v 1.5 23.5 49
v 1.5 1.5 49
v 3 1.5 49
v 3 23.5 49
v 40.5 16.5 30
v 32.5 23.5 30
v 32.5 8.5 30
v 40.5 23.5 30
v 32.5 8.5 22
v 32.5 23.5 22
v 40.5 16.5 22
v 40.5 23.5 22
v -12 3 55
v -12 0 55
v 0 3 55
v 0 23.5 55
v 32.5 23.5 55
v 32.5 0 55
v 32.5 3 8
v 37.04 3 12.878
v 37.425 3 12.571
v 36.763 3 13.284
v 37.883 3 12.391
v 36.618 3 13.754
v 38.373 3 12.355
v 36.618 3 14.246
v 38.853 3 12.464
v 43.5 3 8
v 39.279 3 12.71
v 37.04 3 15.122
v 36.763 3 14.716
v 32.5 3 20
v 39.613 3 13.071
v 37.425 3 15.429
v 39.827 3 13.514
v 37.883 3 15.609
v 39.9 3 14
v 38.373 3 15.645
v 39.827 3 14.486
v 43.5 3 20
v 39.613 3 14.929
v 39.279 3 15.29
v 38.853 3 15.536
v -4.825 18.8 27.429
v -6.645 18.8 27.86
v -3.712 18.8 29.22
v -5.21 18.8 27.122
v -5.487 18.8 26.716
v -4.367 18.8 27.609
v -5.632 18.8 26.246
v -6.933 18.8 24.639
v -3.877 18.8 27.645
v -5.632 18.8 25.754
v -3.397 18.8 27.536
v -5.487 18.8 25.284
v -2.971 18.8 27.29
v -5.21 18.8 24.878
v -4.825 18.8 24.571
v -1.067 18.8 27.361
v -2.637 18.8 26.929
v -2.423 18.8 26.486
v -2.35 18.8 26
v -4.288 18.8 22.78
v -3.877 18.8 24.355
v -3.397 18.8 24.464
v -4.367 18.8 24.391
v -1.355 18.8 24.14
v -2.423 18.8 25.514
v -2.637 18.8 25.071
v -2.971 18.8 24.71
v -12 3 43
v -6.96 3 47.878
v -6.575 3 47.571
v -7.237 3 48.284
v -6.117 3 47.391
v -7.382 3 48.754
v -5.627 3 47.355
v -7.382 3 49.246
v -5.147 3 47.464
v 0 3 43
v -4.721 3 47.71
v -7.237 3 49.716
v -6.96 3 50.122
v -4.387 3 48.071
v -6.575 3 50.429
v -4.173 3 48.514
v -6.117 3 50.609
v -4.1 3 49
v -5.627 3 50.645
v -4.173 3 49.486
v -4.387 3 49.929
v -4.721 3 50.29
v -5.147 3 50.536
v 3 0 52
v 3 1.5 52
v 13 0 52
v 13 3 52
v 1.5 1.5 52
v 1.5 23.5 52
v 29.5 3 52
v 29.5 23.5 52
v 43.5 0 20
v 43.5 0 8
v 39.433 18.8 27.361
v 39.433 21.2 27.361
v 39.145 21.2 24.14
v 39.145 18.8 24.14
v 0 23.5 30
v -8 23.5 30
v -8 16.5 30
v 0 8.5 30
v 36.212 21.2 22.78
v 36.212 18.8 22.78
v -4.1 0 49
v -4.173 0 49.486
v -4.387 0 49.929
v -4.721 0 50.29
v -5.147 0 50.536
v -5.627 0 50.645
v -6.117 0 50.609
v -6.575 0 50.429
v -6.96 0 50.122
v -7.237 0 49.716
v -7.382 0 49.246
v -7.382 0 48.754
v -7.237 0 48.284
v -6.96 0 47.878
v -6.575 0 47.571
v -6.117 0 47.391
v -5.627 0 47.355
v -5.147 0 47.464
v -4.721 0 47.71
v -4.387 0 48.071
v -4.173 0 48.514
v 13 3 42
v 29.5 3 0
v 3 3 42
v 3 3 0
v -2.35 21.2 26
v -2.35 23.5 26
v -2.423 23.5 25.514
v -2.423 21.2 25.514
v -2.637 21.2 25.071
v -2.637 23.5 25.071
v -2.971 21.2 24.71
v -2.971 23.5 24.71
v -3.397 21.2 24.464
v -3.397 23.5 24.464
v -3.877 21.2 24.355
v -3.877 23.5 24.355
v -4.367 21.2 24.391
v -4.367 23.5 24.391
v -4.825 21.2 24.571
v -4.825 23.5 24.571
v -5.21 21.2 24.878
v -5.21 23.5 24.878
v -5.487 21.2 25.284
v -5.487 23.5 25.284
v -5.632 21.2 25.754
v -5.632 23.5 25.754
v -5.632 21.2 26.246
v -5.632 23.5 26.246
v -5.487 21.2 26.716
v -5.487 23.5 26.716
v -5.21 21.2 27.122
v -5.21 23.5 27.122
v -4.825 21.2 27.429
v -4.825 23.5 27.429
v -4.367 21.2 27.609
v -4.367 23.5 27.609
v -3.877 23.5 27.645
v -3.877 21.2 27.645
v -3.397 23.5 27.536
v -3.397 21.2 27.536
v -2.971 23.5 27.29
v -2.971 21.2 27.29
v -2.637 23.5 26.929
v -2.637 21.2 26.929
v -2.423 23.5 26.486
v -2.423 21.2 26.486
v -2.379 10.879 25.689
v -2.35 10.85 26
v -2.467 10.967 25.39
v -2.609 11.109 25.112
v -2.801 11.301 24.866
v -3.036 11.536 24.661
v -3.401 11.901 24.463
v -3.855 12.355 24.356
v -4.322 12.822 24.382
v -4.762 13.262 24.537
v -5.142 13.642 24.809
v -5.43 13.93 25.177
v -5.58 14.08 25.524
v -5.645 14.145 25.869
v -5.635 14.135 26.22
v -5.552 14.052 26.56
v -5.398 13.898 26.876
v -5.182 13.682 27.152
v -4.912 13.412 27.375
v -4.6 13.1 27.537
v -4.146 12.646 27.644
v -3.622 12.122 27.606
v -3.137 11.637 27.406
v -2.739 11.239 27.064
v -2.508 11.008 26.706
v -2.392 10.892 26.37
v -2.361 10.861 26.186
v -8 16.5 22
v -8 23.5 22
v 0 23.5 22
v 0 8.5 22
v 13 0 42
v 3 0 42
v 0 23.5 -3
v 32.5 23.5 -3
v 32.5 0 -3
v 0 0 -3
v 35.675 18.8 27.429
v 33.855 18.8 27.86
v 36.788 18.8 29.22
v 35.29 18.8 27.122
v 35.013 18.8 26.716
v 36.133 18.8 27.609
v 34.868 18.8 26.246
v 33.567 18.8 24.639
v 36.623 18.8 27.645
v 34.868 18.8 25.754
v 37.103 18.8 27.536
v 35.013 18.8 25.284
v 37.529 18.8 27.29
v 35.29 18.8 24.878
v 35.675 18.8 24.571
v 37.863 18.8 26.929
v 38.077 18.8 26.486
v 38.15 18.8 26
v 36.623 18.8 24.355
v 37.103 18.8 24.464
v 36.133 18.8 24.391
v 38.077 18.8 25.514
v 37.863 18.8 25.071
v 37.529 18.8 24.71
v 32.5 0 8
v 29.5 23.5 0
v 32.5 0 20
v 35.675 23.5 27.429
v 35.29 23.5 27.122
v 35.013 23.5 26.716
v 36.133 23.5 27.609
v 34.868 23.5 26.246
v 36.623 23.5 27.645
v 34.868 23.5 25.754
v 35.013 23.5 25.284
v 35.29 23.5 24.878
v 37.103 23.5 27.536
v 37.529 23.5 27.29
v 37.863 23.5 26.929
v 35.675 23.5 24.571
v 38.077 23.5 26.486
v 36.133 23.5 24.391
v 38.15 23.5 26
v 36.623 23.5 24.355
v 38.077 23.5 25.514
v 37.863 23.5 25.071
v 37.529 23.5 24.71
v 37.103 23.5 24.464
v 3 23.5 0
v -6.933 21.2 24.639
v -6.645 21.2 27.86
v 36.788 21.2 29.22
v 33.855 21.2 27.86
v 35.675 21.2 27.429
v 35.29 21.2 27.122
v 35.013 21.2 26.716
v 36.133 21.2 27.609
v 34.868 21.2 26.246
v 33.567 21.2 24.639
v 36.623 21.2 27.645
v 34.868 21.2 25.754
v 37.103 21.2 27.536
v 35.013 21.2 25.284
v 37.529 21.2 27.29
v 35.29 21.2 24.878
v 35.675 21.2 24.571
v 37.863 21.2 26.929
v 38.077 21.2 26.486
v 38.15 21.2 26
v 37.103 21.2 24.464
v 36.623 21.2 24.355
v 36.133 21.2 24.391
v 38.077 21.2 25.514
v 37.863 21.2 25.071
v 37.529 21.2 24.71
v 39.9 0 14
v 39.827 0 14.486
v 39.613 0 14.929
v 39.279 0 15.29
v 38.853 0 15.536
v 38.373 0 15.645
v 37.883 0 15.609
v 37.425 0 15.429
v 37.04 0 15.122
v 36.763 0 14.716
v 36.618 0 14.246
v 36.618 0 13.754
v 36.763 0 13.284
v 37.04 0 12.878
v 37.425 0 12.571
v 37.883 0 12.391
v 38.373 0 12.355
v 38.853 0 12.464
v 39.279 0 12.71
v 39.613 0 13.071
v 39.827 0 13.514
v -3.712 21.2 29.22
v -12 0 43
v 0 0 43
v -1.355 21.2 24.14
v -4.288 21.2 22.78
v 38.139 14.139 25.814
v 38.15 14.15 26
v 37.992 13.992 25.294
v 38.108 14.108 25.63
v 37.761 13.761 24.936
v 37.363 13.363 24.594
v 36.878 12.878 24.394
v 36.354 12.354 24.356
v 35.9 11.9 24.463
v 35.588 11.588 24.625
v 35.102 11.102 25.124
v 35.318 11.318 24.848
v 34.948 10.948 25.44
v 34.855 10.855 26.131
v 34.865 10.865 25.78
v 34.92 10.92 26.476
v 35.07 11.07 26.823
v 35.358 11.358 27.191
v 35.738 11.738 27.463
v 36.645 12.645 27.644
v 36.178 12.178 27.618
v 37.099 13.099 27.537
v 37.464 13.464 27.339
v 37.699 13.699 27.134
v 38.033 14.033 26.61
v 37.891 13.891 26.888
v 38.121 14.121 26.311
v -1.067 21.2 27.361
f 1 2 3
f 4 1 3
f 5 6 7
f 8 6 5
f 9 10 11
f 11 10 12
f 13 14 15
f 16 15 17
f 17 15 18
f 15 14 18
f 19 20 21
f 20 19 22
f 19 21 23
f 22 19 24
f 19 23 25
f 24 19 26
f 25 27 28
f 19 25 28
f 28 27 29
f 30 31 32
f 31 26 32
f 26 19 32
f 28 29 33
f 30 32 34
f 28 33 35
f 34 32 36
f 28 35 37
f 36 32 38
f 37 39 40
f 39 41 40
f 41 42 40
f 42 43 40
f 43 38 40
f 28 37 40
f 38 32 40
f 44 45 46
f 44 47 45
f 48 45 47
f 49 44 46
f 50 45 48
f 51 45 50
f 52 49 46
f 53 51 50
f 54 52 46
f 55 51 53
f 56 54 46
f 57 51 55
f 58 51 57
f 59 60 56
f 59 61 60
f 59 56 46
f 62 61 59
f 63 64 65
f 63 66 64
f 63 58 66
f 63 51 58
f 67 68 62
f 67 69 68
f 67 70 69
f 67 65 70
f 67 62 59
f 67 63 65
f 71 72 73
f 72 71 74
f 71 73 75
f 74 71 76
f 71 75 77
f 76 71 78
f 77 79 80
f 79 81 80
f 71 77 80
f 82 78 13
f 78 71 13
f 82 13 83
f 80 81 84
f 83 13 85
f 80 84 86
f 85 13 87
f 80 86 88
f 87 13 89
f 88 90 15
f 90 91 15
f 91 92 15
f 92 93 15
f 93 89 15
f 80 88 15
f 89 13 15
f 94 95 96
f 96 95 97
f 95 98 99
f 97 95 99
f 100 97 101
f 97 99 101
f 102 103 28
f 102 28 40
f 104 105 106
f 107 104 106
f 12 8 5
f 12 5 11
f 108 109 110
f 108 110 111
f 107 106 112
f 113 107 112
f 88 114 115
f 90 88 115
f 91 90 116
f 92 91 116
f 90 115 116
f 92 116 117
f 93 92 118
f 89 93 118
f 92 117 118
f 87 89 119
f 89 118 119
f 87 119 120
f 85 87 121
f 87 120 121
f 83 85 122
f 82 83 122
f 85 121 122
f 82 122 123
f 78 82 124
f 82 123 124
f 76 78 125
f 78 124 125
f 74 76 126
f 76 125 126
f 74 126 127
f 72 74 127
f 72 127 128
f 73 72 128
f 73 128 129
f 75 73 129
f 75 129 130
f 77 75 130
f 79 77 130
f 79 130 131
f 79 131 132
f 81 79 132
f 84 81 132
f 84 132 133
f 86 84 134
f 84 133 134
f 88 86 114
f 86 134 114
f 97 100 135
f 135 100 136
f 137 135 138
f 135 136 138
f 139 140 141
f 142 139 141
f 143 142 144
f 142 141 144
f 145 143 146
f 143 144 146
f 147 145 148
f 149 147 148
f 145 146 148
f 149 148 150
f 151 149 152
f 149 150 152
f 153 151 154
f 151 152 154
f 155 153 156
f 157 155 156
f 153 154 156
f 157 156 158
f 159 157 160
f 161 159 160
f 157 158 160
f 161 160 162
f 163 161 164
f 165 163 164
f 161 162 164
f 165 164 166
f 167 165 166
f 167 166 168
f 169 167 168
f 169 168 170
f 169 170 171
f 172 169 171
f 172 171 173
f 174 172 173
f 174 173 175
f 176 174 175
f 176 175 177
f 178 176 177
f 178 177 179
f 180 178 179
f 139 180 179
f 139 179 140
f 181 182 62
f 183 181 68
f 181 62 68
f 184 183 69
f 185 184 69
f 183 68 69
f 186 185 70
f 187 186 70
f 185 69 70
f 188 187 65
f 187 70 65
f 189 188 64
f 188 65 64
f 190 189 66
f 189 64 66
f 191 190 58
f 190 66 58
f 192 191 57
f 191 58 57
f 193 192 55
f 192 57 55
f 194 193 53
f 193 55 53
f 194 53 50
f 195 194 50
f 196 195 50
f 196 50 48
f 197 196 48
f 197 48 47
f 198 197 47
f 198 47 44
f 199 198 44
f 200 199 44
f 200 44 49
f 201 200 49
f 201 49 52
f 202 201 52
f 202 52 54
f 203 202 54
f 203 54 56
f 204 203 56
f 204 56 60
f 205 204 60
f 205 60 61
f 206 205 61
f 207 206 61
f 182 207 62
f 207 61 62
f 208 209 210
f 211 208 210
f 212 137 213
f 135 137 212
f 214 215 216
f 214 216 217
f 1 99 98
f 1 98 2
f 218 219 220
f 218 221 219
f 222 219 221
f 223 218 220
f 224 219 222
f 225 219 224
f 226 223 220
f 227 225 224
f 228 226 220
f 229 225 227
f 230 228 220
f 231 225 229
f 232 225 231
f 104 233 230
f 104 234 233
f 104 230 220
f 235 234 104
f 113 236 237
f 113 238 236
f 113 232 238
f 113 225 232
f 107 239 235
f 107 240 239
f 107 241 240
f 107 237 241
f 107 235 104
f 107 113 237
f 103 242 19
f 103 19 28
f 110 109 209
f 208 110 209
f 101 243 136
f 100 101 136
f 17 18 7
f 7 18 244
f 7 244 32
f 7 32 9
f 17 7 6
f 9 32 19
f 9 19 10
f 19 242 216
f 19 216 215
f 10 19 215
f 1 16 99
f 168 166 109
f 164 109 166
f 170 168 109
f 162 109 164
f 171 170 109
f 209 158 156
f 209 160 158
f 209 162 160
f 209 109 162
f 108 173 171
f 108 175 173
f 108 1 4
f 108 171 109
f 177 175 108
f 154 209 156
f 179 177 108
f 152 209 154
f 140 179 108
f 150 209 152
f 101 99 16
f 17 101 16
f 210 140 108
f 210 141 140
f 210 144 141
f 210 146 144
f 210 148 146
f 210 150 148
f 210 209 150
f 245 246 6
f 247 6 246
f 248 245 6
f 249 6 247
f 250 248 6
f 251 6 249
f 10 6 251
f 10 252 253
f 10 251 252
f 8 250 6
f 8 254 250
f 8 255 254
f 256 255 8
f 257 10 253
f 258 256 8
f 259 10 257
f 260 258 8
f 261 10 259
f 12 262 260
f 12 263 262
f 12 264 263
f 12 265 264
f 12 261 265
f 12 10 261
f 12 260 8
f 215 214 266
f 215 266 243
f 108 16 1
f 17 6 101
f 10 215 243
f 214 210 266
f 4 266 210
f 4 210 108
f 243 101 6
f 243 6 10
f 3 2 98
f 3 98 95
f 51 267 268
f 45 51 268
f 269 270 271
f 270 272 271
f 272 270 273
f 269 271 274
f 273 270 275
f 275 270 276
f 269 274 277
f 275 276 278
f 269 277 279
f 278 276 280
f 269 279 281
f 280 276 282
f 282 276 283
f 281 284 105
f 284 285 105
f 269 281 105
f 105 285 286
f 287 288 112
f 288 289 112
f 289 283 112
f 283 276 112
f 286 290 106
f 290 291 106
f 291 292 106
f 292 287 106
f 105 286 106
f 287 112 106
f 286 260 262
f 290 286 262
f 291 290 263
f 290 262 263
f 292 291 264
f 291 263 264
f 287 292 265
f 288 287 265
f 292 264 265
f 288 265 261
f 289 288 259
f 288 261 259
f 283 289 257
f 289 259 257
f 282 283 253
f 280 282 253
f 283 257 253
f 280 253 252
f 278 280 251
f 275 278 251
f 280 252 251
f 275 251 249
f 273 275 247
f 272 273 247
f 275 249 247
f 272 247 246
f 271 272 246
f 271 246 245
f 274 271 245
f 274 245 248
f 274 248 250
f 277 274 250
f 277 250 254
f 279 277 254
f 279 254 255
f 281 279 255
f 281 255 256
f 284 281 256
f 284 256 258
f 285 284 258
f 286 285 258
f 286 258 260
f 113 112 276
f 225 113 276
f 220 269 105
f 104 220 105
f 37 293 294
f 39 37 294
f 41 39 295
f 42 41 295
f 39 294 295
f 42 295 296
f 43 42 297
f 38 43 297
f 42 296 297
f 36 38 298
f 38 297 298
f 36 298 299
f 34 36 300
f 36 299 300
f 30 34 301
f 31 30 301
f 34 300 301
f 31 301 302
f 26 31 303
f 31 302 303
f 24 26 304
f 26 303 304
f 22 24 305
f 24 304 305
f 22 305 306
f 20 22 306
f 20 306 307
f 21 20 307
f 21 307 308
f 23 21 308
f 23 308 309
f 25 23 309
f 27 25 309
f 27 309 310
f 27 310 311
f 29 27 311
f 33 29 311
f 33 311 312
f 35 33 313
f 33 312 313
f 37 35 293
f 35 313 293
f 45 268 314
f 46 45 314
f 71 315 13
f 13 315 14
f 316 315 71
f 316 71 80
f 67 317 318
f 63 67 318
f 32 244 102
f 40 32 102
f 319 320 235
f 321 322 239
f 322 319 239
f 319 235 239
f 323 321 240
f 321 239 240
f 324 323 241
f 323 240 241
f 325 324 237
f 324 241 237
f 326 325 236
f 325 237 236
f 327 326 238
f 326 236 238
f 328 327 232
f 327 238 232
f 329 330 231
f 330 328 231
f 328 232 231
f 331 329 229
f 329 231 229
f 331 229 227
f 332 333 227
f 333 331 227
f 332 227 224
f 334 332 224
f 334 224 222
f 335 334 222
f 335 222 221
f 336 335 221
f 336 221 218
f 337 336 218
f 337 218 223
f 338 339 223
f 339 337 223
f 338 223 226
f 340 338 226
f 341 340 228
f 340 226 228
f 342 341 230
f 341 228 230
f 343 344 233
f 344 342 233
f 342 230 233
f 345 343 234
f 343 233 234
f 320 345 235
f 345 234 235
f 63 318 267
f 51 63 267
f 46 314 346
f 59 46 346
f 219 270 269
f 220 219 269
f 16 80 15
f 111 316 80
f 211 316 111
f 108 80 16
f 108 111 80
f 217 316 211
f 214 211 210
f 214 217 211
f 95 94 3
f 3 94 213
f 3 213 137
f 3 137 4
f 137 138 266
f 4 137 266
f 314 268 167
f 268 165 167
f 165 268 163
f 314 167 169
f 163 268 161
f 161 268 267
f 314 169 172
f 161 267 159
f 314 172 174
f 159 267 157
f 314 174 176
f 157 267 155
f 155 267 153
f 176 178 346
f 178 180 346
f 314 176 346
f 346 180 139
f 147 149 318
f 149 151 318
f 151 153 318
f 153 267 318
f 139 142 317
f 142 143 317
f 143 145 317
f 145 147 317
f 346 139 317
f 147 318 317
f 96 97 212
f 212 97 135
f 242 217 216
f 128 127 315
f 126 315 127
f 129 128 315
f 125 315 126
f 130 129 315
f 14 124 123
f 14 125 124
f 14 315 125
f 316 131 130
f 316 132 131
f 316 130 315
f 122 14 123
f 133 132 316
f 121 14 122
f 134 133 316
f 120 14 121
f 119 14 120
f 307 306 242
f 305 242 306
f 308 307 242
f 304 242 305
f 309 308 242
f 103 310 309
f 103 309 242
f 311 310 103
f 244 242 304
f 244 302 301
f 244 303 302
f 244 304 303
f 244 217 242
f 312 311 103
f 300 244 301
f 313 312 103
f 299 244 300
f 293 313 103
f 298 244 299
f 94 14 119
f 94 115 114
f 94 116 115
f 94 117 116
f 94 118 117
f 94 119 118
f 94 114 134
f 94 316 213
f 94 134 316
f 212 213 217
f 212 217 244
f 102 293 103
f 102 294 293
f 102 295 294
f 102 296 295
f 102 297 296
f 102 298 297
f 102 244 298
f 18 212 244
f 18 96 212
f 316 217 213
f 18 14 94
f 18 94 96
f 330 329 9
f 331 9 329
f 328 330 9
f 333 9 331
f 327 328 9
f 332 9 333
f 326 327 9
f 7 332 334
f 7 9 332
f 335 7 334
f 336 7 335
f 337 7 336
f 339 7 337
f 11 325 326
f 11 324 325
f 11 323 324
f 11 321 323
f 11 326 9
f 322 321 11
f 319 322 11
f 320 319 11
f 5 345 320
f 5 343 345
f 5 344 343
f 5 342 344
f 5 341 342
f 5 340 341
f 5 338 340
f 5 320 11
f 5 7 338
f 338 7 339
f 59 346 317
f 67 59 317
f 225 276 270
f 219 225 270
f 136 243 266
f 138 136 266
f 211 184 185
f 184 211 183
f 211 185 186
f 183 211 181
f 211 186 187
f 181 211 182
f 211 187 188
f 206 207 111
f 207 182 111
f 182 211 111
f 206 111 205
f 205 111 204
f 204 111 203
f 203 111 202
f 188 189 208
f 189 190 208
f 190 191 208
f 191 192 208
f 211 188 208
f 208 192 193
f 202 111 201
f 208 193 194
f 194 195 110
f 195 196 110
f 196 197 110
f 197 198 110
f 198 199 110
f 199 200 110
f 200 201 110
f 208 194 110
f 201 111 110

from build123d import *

# Parameters (mm, degrees)
BOSS_EXTRUDE1_DEPTH = 52
SKETCH2_W           = 32.5
SKETCH2_H           = 23.5
BOSS_EXTRUDE2_DEPTH = 3
SKETCH3_W           = 8
SKETCH3_H           = 8
SKETCH3_R           = 1.65
BOSS_EXTRUDE3_DEPTH = 15
CUT_EXTRUDE1_START  = -2.3
CUT_EXTRUDE1_DEPTH  = 2.4
CUT_EXTRUDE2_DEPTH  = 34
SKETCH6_W           = 32.5
SKETCH6_H           = 23.5
BOSS_EXTRUDE5_DEPTH = 3
SKETCH7_W           = 10
SKETCH7_H           = 10
CUT_EXTRUDE3_DEPTH  = 3
SKETCH8_W           = 9.75
SKETCH8_H           = 3
CUT_EXTRUDE4_DEPTH  = 22
SKETCH9_W           = 11
SKETCH9_H           = 12
SKETCH9_R           = 1.65
SKETCH9_W_2         = 12
BOSS_EXTRUDE6_DEPTH = 3


with BuildPart() as part:
    # Sketch1 → Boss-Extrude1 (new body)
    with BuildSketch(Plane.XY):
        Polygon((3, 20.5), (3, 23.5), (0, 23.5), (0, 0), (32.5, 0), (32.5, 23.5), (29.5, 23.5), (29.5, 20.5), (29.5, 3), (3, 3), align=None)
    extrude(amount=BOSS_EXTRUDE1_DEPTH)

    # Sketch2 → Boss-Extrude2 (add)
    with BuildSketch(Plane(origin=(0, 0, 0), x_dir=(-1, 0, 0), z_dir=(0, 0, -1))):
        with Locations((-16.25, 11.75)):
            Rectangle(SKETCH2_W, SKETCH2_H)
    extrude(amount=BOSS_EXTRUDE2_DEPTH)

    # Sketch3 → Boss-Extrude3 (add)
    with BuildSketch(Plane(origin=(0, 23.5, 0), x_dir=(1, 0, 0), z_dir=(0, 1, 0))):
        with Locations((-4, -26)):
            Rectangle(SKETCH3_W, SKETCH3_H)
        with Locations((-4, -26)):
            Circle(SKETCH3_R, mode=Mode.SUBTRACT)
        with Locations((36.5, -26)):
            Rectangle(SKETCH3_W, SKETCH3_H)
        with Locations((36.5, -26)):
            Circle(SKETCH3_R, mode=Mode.SUBTRACT)
    extrude(amount=-BOSS_EXTRUDE3_DEPTH)

    # Sketch4 → Cut-Extrude1 (cut)
    with BuildSketch(Plane(origin=(0, 23.5, 0), x_dir=(1, 0, 0), z_dir=(0, 1, 0)).offset(CUT_EXTRUDE1_START)):
        Polygon((-1.067108801, -27.360691938), (-1.355160616, -24.140387685), (-4.288051814, -22.779695746), (-6.932891199, -24.639308062), (-6.644839384, -27.859612315), (-3.711948186, -29.220304254), align=None)
        Polygon((39.432891199, -27.360691938), (39.144839384, -24.140387685), (36.211948186, -22.779695746), (33.567108801, -24.639308062), (33.855160616, -27.859612315), (36.788051814, -29.220304254), align=None)
    extrude(amount=-CUT_EXTRUDE1_DEPTH, mode=Mode.SUBTRACT)

    # Sketch5 → Cut-Extrude2 (cut, through all)
    with BuildSketch(Plane.XY.offset(30)):
        Polygon((40.5, 8.5), (32.5, 8.5), (40.5, 16.5), align=None)
        Polygon((-8, 8.5), (0, 8.5), (-8, 16.5), align=None)
    extrude(amount=-CUT_EXTRUDE2_DEPTH, mode=Mode.SUBTRACT)

    # Sketch6 → Boss-Extrude5 (add)
    with BuildSketch(Plane.XY.offset(52)):
        with Locations((16.25, 11.75)):
            Rectangle(SKETCH6_W, SKETCH6_H)
    extrude(amount=BOSS_EXTRUDE5_DEPTH)

    # Sketch7 → Cut-Extrude3 (cut)
    with BuildSketch(Plane(origin=(0, 3, 0), x_dir=(1, 0, 0), z_dir=(0, 1, 0))):
        with Locations((8, -47)):
            Rectangle(SKETCH7_W, SKETCH7_H)
    extrude(amount=-CUT_EXTRUDE3_DEPTH, mode=Mode.SUBTRACT)

    # Sketch8 → Cut-Extrude4 (cut)
    with BuildSketch(Plane(origin=(0, 23.5, 0), x_dir=(1, 0, 0), z_dir=(0, 1, 0))):
        with Locations((6.375, -50.5)):
            Rectangle(SKETCH8_W, SKETCH8_H)
    extrude(amount=-CUT_EXTRUDE4_DEPTH, mode=Mode.SUBTRACT)

    # Sketch9 → Boss-Extrude6 (add)
    with BuildSketch(Plane.XZ):
        with Locations((38, 14)):
            Rectangle(SKETCH9_W, SKETCH9_H)
        with Locations((38.25, 14)):
            Circle(SKETCH9_R, mode=Mode.SUBTRACT)
        with Locations((-6, 49)):
            Rectangle(SKETCH9_W_2, SKETCH9_H)
        with Locations((-5.75, 49)):
            Circle(SKETCH9_R, mode=Mode.SUBTRACT)
    extrude(amount=-BOSS_EXTRUDE6_DEPTH)


solid = part.part
